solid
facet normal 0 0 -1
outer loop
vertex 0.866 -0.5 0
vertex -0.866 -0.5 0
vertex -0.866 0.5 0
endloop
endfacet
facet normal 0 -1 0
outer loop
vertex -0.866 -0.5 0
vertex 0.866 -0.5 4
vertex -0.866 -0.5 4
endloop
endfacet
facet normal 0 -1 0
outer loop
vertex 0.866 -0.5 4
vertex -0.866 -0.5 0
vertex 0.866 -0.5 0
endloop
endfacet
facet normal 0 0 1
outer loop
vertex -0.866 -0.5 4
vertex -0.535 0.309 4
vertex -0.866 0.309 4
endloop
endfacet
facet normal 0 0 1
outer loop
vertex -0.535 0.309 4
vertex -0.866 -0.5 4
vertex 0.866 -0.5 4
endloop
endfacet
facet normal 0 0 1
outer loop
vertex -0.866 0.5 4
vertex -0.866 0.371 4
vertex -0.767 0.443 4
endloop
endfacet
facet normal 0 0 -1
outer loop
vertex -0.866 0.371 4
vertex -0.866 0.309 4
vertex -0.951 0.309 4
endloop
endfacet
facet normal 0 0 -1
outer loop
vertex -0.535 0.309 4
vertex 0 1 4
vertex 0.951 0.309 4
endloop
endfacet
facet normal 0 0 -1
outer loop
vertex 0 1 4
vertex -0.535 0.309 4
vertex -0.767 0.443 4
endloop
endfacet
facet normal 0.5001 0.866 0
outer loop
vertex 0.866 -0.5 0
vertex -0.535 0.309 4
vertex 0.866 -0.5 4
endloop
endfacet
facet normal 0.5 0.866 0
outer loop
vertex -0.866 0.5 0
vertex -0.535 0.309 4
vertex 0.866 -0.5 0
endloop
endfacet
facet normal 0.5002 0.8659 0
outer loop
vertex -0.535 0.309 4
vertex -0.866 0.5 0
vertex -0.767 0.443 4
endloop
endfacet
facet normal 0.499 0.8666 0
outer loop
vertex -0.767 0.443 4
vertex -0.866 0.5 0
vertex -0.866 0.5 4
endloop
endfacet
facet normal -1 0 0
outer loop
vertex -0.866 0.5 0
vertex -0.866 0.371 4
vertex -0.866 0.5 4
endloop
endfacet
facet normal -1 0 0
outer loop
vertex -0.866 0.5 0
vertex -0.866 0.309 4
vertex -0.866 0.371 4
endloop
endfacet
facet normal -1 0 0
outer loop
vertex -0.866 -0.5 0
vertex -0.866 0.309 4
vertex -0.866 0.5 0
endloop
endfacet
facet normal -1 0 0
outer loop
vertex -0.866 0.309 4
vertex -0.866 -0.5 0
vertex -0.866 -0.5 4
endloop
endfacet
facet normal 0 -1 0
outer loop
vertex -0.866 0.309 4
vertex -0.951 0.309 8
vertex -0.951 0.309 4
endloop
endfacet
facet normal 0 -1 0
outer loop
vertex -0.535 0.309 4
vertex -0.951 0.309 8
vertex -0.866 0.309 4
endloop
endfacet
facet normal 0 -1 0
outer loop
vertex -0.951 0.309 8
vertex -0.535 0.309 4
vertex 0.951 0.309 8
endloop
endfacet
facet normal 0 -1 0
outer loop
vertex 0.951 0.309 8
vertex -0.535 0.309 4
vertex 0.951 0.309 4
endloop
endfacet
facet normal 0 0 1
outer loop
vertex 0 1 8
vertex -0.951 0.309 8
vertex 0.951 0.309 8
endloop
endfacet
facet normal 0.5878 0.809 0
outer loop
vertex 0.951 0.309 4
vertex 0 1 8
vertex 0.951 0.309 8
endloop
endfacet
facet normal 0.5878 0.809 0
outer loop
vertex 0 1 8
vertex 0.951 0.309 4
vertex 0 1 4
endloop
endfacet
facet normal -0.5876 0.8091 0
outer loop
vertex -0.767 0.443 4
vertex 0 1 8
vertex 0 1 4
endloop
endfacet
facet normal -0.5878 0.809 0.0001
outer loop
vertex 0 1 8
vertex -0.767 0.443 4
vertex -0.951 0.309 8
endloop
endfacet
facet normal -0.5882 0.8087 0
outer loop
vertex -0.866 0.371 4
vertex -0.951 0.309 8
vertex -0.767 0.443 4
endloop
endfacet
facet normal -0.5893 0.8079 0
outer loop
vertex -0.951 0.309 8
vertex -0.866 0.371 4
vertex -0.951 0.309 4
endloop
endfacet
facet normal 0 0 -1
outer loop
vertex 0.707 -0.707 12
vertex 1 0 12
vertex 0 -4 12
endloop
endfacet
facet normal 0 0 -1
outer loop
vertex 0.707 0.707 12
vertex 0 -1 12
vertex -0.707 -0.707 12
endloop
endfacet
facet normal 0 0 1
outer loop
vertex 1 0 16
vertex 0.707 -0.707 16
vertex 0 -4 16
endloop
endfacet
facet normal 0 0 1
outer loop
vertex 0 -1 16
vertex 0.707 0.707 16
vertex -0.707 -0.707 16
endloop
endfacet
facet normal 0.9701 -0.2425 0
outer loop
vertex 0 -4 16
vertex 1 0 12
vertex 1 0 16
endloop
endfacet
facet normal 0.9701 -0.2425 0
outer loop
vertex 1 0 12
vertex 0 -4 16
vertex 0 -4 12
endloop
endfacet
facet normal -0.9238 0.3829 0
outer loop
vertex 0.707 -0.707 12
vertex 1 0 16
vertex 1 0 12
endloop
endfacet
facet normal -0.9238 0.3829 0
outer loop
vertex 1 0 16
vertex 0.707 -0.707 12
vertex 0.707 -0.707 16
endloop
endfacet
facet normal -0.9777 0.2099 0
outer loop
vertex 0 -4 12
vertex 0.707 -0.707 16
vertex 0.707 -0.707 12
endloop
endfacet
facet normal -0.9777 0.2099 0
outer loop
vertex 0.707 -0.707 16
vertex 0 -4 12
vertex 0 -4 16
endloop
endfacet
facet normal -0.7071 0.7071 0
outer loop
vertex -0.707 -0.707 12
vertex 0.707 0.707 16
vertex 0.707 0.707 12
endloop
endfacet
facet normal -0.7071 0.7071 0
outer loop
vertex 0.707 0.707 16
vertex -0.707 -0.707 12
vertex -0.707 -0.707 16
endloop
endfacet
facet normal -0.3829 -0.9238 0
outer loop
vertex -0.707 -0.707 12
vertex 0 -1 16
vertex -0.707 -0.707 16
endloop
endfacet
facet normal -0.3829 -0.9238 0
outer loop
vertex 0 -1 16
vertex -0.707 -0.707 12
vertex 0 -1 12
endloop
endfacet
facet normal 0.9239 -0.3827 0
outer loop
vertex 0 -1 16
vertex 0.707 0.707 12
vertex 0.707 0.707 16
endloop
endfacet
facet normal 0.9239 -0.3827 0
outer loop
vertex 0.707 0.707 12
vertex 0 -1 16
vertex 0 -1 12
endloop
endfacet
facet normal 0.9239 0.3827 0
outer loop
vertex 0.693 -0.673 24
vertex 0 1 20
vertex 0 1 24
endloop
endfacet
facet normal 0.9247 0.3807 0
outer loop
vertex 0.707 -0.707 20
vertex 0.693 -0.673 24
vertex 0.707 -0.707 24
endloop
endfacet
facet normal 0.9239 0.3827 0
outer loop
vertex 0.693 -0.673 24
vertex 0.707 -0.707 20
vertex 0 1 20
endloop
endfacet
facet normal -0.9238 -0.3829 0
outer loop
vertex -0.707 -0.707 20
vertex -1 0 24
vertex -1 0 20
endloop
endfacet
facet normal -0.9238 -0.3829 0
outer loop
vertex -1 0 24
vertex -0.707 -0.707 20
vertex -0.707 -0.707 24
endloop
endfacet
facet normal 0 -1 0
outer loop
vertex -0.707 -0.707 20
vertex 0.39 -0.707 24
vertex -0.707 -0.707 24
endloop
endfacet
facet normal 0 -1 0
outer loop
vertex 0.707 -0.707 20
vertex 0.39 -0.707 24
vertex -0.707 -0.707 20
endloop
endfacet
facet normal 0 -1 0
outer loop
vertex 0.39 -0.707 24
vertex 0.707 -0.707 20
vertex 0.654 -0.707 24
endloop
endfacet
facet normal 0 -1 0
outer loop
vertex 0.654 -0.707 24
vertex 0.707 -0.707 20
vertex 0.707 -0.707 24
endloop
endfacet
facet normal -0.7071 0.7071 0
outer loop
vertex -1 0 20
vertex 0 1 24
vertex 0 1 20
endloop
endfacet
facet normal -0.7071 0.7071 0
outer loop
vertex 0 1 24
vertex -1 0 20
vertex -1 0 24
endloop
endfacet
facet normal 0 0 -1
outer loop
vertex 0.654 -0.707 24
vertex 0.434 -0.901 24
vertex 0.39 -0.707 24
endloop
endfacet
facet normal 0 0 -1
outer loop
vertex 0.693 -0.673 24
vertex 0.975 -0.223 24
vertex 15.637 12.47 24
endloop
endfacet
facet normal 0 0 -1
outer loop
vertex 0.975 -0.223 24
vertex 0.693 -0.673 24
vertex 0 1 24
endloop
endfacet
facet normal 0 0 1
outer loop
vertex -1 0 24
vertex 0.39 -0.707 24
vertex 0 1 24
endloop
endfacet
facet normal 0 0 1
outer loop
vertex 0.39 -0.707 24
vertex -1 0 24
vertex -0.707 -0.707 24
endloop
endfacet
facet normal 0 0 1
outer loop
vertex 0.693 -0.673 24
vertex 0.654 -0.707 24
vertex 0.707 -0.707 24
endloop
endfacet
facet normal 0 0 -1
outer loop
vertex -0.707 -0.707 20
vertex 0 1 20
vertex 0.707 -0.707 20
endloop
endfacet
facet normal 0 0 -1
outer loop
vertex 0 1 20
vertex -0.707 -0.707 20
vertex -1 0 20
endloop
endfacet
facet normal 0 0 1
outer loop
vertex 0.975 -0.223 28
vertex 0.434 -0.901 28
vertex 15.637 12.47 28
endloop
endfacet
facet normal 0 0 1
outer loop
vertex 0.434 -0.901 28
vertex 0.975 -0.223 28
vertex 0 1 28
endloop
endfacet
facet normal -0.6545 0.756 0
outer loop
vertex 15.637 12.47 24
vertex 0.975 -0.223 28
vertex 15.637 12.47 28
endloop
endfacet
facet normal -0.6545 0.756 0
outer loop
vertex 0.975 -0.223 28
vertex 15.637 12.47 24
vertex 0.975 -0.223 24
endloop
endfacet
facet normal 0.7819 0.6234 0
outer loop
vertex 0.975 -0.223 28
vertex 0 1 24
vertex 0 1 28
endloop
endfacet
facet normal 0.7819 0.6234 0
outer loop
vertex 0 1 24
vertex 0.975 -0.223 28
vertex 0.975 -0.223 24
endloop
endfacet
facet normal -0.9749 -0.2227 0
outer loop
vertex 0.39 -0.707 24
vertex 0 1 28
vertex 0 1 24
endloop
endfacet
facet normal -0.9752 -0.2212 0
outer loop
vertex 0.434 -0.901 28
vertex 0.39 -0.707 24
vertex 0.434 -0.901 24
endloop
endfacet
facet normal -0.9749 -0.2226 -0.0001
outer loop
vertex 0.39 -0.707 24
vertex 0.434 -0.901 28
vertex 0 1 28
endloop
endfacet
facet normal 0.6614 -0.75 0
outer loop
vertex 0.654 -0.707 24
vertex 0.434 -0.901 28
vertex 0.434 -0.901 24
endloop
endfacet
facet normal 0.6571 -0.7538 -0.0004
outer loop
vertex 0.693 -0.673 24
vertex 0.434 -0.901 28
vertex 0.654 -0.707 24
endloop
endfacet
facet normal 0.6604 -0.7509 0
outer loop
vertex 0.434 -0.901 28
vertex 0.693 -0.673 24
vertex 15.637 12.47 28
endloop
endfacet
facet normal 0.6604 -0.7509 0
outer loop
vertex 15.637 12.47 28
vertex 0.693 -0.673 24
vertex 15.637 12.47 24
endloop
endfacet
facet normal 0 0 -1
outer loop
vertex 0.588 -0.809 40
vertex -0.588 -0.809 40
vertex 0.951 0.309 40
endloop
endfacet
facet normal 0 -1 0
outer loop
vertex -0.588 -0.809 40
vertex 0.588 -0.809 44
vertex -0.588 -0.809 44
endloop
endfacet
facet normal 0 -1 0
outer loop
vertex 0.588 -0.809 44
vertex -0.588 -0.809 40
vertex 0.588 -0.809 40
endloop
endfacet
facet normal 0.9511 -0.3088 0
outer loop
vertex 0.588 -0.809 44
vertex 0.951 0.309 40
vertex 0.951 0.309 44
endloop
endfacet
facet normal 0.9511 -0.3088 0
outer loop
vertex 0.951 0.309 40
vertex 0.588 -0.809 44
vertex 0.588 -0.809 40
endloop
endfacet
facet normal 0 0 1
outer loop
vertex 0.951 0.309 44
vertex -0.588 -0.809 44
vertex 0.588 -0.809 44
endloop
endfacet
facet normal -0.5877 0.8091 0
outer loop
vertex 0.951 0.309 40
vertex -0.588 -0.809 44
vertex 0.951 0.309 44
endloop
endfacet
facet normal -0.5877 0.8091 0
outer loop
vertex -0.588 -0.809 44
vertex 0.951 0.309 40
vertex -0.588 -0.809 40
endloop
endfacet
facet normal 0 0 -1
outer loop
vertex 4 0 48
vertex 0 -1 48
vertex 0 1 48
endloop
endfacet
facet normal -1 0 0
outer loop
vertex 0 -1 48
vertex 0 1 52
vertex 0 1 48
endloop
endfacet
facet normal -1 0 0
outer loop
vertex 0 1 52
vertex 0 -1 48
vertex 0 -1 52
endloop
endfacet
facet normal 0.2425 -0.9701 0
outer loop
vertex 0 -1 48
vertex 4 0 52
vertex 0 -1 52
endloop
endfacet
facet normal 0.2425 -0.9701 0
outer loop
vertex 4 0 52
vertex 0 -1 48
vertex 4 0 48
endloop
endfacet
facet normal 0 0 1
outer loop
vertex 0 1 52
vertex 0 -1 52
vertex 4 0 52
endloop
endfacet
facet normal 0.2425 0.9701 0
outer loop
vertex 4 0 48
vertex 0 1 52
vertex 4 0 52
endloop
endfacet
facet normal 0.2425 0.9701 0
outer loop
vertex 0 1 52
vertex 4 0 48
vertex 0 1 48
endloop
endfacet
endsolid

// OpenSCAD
union() {
	translate(v = [0, 0, 0]) {
		linear_extrude(height = 4) {
			polygon(paths = [[0, 1, 2, 3, 4, 5]], points = [[0.866025403784, -0.5], [-7.34788079488e-16, 1.0], [0.866025403784, -0.5], [-0.866025403784, -0.5], [-0.866025403784, 0.5], [-0.866025403784, 0.5]]);
		}
	}
	translate(v = [0, 0, 4]) {
		linear_extrude(height = 4) {
			polygon(paths = [[0, 1, 2, 3, 4]], points = [[-0.951056516295, 0.309016994375], [-4.89858719659e-16, 1.0], [0.951056516295, 0.309016994375], [-0.951056516295, 0.309016994375], [0.951056516295, 0.309016994375]]);
		}
	}
	translate(v = [0, 0, 8]) {
		linear_extrude(height = 4) {
			polygon(paths = [[0, 1]], points = [[6.12323399574e-16, -1.0], [8.57252759403e-16, -1.0]]);
		}
	}
	translate(v = [0, 0, 12]) {
		linear_extrude(height = 4) {
			polygon(paths = [[0, 1, 2, 3, 4, 5, 6, 7]], points = [[0.707106781187, 0.707106781187], [1.0, 5.51091059616e-16], [0.707106781187, -0.707106781187], [2.44929359829e-15, -4.0], [1.0, -9.80336419954e-16], [0.707106781187, 0.707106781187], [-0.707106781187, -0.707106781187], [-1.96067283991e-15, -1.0]]);
		}
	}
	translate(v = [0, 0, 16]) {
		linear_extrude(height = 4) {
			polygon(paths = [[0, 1, 2, 3, 4, 5, 6]], points = [[-0.974927912182, -0.222520933956], [-3.12732592987, 2.49395920743], [-0.433883739118, -0.900968867902], [0.974927912182, -0.222520933956], [-0.974927912182, -0.222520933956], [-3.12732592987, 2.49395920743], [0.781831482468, 0.623489801859]]);
		}
	}
	translate(v = [0, 0, 20]) {
		linear_extrude(height = 4) {
			polygon(paths = [[0, 1, 2, 3, 4, 5, 6, 7]], points = [[1.0, 6.12323399574e-17], [0.707106781187, -0.707106781187], [-2.44929359829e-16, 1.0], [-1.0, -4.28626379702e-16], [-0.707106781187, -0.707106781187], [0.707106781187, -0.707106781187], [1.0, -2.45548340466e-16], [0.707106781187, -0.707106781187]]);
		}
	}
	translate(v = [0, 0, 24]) {
		linear_extrude(height = 4) {
			polygon(paths = [[0, 1, 2, 3, 4, 5, 6]], points = [[0.0, 1.0], [-0.974927912182, -0.222520933956], [-2.44929359829e-16, 1.0], [0.433883739118, -0.900968867902], [0.433883739118, -0.900968867902], [15.6366296494, 12.4697960372], [0.974927912182, -0.222520933956]]);
		}
	}
	translate(v = [0, 0, 28]) {
		linear_extrude(height = 4) {
			polygon(paths = [[0, 1, 2, 3, 4, 5, 6, 7, 8, 9]], points = [[0.951056516295, -0.309016994375], [0.587785252292, -0.809016994375], [3.67394039744e-16, -1.0], [-0.951056516295, 0.309016994375], [-1.95943487864e-15, 4.0], [3.80422606518, -1.2360679775], [0.587785252292, -0.809016994375], [-0.951056516295, 0.309016994375], [-0.587785252292, 0.809016994375], [-0.951056516295, -0.309016994375]]);
		}
	}
	translate(v = [0, 0, 32]) {
		linear_extrude(height = 4) {
			polygon(paths = [[0, 1, 2, 3, 4, 5, 6]], points = [[0.433883739118, -0.900968867902], [-0.433883739118, -0.900968867902], [-7.34788079488e-16, 1.0], [-0.433883739118, -0.900968867902], [0.781831482468, 0.623489801859], [-0.974927912182, -0.222520933956], [-1.71450551881e-15, 1.0]]);
		}
	}
	translate(v = [0, 0, 36]) {
		linear_extrude(height = 4) {
			polygon(paths = [[0, 1, 2, 3, 4, 5]], points = [[0.866025403784, -0.5], [-0.866025403784, 0.5], [-0.866025403784, -0.5], [0.866025403784, -0.5], [0.866025403784, 0.5], [5.38968387752e-15, -1.0]]);
		}
	}
	translate(v = [0, 0, 40]) {
		linear_extrude(height = 4) {
			polygon(paths = [[0, 1, 2, 3, 4]], points = [[0.587785252292, -0.809016994375], [-0.587785252292, -0.809016994375], [-0.587785252292, -0.809016994375], [0.951056516295, 0.309016994375], [0.951056516295, 0.309016994375]]);
		}
	}
	translate(v = [0, 0, 44]) {
		linear_extrude(height = 4) {
			polygon(paths = [[0, 1, 2, 3, 4]], points = [[-3.80422606518, 1.2360679775], [-0.951056516295, 0.309016994375], [-0.951056516295, 0.309016994375], [-0.587785252292, -0.809016994375], [-0.951056516295, 0.309016994375]]);
		}
	}
	translate(v = [0, 0, 48]) {
		linear_extrude(height = 4) {
			polygon(paths = [[0, 1, 2, 3]], points = [[-1.46957615898e-15, 1.0], [4.0, 9.77241516772e-16], [5.87954259718e-15, -1.0], [-2.93915231795e-15, 1.0]]);
		}
	}
	translate(v = [0, 0, 52]) {
		linear_extrude(height = 4) {
			polygon(paths = [[0, 1, 2, 3, 4, 5, 6, 7, 8, 9]], points = [[1.22464679915e-16, -1.0], [-0.587785252292, -0.809016994375], [0.587785252292, 0.809016994375], [0.951056516295, -0.309016994375], [-0.587785252292, 0.809016994375], [0.951056516295, 0.309016994375], [-0.951056516295, 0.309016994375], [0.587785252292, -0.809016994375], [0.951056516295, -0.309016994375], [-0.951056516295, -0.309016994375]]);
		}
	}
	translate(v = [0, 0, 56]) {
		linear_extrude(height = 4) {
			polygon(paths = [[0, 1, 2, 3, 4]], points = [[0.951056516295, 0.309016994375], [0.951056516295, 0.309016994375], [0.587785252292, -0.809016994375], [-1.46957615898e-15, 1.0], [-0.587785252292, -0.809016994375]]);
		}
	}
}
